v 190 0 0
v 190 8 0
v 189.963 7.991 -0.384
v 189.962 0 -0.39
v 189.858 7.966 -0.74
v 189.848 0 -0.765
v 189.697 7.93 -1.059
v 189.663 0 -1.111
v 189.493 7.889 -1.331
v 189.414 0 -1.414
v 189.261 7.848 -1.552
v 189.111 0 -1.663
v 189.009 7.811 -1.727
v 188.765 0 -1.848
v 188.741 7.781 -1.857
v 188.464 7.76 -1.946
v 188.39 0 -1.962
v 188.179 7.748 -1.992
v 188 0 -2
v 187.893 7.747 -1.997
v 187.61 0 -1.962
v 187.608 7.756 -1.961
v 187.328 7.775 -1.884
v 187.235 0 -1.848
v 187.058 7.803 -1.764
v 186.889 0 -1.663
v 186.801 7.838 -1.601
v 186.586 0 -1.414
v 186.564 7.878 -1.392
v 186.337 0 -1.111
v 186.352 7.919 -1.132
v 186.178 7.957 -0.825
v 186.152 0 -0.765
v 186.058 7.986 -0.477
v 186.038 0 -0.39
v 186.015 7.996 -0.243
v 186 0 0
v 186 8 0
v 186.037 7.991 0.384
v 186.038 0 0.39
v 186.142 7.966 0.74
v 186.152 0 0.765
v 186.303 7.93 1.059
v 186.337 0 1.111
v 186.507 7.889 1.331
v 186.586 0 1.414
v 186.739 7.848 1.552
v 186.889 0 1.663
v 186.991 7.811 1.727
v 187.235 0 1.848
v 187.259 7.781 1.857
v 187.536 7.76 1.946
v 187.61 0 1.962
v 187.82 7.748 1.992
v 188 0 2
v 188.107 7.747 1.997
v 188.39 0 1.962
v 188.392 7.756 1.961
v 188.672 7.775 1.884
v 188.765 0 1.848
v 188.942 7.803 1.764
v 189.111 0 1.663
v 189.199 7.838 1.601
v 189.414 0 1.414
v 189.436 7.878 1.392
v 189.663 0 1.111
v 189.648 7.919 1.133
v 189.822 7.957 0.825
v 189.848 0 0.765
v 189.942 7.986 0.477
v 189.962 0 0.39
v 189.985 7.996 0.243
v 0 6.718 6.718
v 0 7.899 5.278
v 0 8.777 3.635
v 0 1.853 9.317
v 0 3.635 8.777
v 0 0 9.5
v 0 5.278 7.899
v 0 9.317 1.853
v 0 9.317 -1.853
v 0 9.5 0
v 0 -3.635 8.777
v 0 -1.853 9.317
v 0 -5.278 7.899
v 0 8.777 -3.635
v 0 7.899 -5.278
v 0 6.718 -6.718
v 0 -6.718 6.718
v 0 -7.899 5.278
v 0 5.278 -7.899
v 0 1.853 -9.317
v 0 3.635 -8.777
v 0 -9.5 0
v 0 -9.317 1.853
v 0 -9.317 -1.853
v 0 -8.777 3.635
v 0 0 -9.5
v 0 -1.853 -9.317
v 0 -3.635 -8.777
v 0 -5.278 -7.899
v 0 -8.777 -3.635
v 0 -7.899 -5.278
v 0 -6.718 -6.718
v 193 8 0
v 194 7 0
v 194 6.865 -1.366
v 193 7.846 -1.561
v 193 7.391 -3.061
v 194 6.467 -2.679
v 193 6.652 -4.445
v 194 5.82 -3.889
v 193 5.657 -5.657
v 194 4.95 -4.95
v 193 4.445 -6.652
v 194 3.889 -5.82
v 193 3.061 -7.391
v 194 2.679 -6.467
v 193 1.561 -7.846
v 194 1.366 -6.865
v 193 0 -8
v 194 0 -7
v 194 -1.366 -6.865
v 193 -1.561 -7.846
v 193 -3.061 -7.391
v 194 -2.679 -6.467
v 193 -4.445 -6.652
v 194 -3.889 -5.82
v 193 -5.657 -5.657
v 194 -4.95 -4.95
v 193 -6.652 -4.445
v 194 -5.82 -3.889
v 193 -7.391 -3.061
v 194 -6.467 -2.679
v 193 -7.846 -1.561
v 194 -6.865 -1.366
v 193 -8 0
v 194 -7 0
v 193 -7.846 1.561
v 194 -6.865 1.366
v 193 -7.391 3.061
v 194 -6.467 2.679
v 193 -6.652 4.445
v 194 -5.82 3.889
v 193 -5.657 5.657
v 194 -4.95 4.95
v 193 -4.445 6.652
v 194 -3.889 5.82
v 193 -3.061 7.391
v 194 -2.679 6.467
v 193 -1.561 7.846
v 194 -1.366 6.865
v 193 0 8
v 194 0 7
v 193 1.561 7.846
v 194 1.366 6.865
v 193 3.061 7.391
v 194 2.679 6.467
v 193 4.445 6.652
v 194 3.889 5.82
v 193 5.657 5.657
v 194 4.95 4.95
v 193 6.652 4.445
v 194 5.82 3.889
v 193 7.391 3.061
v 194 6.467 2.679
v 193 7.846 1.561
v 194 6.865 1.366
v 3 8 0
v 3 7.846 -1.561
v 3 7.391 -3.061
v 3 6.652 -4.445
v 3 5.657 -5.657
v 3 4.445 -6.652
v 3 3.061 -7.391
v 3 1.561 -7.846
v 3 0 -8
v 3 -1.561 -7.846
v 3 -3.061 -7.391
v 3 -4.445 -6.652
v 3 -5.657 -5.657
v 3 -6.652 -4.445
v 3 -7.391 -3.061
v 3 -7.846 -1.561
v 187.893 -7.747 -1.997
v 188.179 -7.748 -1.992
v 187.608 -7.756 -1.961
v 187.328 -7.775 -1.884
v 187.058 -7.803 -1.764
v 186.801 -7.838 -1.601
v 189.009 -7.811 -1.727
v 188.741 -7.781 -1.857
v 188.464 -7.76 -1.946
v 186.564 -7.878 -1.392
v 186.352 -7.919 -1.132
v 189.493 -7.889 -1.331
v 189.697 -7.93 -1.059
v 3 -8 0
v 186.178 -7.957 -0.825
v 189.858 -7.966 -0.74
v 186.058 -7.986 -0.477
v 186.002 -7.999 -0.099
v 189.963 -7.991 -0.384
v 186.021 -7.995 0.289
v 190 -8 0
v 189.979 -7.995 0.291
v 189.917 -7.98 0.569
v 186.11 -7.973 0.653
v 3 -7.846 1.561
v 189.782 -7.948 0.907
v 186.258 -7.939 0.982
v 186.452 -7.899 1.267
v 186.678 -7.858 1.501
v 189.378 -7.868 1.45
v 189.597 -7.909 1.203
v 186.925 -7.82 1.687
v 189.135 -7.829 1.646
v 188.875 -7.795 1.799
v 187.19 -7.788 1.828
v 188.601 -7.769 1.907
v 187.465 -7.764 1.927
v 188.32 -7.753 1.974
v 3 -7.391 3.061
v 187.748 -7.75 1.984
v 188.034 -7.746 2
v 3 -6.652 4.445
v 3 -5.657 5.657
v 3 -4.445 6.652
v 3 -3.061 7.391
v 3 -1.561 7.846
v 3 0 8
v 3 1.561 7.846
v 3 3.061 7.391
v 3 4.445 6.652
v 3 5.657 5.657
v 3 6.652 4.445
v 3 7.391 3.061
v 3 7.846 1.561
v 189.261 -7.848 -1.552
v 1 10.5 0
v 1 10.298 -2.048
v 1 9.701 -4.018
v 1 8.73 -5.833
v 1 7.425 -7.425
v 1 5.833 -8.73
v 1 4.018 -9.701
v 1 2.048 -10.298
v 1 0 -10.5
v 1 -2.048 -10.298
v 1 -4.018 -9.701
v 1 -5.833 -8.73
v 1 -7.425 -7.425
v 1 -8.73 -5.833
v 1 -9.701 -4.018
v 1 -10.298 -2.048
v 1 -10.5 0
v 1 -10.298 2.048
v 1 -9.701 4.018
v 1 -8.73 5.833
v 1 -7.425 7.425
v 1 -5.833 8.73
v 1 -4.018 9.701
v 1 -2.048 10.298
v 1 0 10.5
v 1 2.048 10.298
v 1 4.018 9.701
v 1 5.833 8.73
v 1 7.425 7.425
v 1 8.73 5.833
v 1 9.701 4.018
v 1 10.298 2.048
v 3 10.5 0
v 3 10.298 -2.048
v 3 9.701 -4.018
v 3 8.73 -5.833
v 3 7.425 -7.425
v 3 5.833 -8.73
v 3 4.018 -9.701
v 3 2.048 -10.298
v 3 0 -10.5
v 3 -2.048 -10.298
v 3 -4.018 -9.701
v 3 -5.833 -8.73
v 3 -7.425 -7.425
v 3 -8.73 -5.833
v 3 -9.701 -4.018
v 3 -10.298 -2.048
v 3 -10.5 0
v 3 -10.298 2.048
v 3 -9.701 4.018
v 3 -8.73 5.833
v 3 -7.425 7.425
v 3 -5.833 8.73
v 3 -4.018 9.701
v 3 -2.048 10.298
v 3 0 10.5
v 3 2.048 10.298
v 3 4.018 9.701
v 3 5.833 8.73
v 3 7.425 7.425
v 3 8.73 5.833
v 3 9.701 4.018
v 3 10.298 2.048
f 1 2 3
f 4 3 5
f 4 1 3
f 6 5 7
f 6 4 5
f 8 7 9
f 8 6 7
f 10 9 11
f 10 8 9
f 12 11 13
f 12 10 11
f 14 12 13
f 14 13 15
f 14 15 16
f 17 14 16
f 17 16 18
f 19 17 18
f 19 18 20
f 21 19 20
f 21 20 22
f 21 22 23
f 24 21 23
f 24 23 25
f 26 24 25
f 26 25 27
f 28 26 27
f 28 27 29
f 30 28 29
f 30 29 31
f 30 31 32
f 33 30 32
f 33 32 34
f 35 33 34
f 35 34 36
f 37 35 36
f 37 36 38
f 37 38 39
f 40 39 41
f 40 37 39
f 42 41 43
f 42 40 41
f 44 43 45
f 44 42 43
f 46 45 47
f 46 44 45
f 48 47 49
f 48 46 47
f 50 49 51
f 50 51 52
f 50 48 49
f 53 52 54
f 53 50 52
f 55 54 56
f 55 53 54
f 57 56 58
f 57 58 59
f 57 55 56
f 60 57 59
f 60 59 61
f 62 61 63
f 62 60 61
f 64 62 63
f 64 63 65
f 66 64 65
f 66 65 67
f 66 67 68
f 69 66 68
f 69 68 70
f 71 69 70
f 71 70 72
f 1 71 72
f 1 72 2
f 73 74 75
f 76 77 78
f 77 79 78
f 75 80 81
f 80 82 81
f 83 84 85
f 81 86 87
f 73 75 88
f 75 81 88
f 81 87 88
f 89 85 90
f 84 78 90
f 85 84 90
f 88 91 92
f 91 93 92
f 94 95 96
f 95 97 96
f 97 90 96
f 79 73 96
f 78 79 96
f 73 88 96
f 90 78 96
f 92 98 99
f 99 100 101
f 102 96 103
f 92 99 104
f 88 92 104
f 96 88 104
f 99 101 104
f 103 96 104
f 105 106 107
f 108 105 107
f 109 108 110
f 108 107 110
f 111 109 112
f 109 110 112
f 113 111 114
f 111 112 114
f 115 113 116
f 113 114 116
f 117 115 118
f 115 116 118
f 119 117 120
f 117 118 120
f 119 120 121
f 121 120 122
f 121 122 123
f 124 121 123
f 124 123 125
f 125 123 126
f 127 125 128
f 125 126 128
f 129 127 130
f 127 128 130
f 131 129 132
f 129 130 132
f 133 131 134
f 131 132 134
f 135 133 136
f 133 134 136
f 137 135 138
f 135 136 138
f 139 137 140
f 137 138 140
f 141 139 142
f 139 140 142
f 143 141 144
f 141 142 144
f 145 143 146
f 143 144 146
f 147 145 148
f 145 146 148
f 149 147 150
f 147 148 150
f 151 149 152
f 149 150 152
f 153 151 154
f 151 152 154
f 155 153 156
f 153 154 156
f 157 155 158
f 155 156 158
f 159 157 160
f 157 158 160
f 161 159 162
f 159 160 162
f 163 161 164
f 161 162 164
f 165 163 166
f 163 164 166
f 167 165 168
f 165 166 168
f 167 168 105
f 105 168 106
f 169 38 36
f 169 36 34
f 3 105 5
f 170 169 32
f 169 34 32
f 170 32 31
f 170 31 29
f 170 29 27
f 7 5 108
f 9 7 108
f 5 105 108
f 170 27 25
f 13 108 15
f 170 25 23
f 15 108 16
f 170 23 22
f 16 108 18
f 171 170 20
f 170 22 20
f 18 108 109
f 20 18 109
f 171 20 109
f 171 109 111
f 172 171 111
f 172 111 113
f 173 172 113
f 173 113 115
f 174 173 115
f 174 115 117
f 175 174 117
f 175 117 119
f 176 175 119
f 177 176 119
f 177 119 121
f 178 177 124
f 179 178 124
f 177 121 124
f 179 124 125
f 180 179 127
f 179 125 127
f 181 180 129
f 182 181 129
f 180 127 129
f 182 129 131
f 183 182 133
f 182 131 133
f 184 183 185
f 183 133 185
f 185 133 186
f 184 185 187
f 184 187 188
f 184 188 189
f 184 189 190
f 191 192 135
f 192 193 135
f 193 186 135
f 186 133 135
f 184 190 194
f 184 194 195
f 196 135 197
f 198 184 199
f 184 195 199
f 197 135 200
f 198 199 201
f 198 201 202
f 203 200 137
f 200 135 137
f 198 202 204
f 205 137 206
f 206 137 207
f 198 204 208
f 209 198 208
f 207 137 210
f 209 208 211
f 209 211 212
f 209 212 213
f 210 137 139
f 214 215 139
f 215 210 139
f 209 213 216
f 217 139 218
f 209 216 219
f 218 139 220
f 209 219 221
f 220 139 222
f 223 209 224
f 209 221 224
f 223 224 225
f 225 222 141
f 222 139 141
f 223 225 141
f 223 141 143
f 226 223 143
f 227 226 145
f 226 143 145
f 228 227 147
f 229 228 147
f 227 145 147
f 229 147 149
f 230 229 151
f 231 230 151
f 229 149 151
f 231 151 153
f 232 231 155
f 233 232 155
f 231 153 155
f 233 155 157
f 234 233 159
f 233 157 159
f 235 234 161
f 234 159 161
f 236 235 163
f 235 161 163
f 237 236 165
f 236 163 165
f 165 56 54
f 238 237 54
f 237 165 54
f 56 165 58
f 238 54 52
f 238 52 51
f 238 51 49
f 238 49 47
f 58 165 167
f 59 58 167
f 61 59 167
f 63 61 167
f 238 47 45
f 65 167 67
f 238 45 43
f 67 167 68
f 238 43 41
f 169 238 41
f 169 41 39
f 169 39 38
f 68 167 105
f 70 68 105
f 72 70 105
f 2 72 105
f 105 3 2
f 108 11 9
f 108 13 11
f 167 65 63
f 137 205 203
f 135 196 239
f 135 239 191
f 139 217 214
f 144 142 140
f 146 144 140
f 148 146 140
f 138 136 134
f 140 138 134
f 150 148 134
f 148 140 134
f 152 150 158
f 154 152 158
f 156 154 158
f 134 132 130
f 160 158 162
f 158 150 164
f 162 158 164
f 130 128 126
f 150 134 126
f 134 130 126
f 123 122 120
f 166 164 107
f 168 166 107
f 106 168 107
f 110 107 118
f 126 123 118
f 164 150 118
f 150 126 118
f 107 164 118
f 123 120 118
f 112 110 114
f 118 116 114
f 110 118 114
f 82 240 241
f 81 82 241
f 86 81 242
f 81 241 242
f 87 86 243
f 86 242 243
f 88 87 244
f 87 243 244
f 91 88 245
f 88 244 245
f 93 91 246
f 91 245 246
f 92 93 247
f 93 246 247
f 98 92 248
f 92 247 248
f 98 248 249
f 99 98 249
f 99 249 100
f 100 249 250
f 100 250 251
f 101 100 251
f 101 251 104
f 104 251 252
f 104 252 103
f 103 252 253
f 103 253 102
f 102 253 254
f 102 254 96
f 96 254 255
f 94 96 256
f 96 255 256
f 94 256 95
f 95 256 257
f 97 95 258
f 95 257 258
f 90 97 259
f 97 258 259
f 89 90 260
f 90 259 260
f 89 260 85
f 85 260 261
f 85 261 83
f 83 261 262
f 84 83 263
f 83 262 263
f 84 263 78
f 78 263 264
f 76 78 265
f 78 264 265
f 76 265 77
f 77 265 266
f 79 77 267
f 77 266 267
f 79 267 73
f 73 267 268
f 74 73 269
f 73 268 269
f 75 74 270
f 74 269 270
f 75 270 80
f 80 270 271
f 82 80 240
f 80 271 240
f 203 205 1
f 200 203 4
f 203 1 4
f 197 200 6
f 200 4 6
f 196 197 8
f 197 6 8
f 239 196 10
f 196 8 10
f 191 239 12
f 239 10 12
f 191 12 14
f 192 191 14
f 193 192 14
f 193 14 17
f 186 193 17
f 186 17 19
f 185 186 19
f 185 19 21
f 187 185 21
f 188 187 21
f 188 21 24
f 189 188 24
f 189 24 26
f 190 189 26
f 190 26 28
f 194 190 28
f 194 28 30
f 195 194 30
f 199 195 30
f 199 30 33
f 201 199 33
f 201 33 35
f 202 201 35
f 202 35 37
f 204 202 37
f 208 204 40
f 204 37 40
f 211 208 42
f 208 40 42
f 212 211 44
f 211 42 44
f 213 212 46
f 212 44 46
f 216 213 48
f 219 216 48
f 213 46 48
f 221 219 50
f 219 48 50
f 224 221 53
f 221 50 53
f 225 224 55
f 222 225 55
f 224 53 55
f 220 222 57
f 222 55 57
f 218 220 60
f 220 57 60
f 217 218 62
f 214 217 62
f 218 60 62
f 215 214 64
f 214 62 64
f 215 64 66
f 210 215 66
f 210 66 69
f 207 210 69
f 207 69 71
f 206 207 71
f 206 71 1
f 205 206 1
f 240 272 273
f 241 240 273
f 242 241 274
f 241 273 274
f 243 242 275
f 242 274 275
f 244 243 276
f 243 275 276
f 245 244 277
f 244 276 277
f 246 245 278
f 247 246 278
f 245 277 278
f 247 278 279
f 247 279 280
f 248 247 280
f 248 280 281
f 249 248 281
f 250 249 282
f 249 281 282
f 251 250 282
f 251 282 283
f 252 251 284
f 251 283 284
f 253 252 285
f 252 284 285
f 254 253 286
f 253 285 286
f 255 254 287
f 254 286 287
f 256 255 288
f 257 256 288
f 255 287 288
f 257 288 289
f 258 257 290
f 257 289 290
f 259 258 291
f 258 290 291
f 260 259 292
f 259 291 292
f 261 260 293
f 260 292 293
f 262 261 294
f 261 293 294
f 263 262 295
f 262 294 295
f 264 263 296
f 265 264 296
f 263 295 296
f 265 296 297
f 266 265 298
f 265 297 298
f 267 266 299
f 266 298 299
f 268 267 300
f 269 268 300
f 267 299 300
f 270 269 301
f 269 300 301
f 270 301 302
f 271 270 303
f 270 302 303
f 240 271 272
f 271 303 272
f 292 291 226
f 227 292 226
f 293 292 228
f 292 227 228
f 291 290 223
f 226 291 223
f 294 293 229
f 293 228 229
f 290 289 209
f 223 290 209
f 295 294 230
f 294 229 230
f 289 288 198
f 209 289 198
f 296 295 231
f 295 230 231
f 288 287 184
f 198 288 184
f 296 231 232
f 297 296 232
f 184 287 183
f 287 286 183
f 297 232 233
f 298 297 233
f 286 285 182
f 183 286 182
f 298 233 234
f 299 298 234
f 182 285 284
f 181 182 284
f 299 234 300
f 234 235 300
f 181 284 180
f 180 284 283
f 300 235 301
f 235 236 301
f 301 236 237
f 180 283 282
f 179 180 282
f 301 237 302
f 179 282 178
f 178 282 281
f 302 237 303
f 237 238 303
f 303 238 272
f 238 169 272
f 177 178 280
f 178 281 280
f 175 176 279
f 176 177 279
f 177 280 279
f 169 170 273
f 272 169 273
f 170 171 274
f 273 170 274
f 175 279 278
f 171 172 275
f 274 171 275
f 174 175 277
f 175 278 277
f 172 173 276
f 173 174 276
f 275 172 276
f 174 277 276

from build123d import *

# Parameters (mm, degrees)
SZKIC2_R                        = 2
WYTNIJ_WYCI_GNI_CIE1_DEPTH      = 11.5
WYTNIJ_WYCI_GNI_CIE1_DEPTH_BACK = 11.5
SFAZOWANIE1_SIZE                = 1


with BuildPart() as part:
    # Szkic1 → Obrót1 (revolve)
    with BuildSketch(Plane.XY):
        Polygon((0, 0), (0, 10.5), (3, 10.5), (3, 8), (194, 8), (194, 0), align=None)
    revolve(axis=Axis((194, 0, 0), (-1, 0, 0)))

    # Szkic2 → Wytnij-wyciągnięcie1 (cut, two sides)
    with BuildSketch(Plane(origin=(0, 0, 0), x_dir=(1, 0, 0), z_dir=(0, 1, 0))) as wytnij_wyci_gni_cie1_sk:
        with Locations((188, 0)):
            Circle(SZKIC2_R)
    extrude(amount=WYTNIJ_WYCI_GNI_CIE1_DEPTH, mode=Mode.SUBTRACT)
    extrude(wytnij_wyci_gni_cie1_sk.sketch, amount=-WYTNIJ_WYCI_GNI_CIE1_DEPTH_BACK, mode=Mode.SUBTRACT)

    # Sfazowanie1
    sfazowanie1_edges = [part.edges().sort_by_distance(p)[0] for p in [
        (194, -8, 0),
        (0, -10.5, 0),
    ]]
    chamfer(sfazowanie1_edges, length=SFAZOWANIE1_SIZE)


solid = part.part
